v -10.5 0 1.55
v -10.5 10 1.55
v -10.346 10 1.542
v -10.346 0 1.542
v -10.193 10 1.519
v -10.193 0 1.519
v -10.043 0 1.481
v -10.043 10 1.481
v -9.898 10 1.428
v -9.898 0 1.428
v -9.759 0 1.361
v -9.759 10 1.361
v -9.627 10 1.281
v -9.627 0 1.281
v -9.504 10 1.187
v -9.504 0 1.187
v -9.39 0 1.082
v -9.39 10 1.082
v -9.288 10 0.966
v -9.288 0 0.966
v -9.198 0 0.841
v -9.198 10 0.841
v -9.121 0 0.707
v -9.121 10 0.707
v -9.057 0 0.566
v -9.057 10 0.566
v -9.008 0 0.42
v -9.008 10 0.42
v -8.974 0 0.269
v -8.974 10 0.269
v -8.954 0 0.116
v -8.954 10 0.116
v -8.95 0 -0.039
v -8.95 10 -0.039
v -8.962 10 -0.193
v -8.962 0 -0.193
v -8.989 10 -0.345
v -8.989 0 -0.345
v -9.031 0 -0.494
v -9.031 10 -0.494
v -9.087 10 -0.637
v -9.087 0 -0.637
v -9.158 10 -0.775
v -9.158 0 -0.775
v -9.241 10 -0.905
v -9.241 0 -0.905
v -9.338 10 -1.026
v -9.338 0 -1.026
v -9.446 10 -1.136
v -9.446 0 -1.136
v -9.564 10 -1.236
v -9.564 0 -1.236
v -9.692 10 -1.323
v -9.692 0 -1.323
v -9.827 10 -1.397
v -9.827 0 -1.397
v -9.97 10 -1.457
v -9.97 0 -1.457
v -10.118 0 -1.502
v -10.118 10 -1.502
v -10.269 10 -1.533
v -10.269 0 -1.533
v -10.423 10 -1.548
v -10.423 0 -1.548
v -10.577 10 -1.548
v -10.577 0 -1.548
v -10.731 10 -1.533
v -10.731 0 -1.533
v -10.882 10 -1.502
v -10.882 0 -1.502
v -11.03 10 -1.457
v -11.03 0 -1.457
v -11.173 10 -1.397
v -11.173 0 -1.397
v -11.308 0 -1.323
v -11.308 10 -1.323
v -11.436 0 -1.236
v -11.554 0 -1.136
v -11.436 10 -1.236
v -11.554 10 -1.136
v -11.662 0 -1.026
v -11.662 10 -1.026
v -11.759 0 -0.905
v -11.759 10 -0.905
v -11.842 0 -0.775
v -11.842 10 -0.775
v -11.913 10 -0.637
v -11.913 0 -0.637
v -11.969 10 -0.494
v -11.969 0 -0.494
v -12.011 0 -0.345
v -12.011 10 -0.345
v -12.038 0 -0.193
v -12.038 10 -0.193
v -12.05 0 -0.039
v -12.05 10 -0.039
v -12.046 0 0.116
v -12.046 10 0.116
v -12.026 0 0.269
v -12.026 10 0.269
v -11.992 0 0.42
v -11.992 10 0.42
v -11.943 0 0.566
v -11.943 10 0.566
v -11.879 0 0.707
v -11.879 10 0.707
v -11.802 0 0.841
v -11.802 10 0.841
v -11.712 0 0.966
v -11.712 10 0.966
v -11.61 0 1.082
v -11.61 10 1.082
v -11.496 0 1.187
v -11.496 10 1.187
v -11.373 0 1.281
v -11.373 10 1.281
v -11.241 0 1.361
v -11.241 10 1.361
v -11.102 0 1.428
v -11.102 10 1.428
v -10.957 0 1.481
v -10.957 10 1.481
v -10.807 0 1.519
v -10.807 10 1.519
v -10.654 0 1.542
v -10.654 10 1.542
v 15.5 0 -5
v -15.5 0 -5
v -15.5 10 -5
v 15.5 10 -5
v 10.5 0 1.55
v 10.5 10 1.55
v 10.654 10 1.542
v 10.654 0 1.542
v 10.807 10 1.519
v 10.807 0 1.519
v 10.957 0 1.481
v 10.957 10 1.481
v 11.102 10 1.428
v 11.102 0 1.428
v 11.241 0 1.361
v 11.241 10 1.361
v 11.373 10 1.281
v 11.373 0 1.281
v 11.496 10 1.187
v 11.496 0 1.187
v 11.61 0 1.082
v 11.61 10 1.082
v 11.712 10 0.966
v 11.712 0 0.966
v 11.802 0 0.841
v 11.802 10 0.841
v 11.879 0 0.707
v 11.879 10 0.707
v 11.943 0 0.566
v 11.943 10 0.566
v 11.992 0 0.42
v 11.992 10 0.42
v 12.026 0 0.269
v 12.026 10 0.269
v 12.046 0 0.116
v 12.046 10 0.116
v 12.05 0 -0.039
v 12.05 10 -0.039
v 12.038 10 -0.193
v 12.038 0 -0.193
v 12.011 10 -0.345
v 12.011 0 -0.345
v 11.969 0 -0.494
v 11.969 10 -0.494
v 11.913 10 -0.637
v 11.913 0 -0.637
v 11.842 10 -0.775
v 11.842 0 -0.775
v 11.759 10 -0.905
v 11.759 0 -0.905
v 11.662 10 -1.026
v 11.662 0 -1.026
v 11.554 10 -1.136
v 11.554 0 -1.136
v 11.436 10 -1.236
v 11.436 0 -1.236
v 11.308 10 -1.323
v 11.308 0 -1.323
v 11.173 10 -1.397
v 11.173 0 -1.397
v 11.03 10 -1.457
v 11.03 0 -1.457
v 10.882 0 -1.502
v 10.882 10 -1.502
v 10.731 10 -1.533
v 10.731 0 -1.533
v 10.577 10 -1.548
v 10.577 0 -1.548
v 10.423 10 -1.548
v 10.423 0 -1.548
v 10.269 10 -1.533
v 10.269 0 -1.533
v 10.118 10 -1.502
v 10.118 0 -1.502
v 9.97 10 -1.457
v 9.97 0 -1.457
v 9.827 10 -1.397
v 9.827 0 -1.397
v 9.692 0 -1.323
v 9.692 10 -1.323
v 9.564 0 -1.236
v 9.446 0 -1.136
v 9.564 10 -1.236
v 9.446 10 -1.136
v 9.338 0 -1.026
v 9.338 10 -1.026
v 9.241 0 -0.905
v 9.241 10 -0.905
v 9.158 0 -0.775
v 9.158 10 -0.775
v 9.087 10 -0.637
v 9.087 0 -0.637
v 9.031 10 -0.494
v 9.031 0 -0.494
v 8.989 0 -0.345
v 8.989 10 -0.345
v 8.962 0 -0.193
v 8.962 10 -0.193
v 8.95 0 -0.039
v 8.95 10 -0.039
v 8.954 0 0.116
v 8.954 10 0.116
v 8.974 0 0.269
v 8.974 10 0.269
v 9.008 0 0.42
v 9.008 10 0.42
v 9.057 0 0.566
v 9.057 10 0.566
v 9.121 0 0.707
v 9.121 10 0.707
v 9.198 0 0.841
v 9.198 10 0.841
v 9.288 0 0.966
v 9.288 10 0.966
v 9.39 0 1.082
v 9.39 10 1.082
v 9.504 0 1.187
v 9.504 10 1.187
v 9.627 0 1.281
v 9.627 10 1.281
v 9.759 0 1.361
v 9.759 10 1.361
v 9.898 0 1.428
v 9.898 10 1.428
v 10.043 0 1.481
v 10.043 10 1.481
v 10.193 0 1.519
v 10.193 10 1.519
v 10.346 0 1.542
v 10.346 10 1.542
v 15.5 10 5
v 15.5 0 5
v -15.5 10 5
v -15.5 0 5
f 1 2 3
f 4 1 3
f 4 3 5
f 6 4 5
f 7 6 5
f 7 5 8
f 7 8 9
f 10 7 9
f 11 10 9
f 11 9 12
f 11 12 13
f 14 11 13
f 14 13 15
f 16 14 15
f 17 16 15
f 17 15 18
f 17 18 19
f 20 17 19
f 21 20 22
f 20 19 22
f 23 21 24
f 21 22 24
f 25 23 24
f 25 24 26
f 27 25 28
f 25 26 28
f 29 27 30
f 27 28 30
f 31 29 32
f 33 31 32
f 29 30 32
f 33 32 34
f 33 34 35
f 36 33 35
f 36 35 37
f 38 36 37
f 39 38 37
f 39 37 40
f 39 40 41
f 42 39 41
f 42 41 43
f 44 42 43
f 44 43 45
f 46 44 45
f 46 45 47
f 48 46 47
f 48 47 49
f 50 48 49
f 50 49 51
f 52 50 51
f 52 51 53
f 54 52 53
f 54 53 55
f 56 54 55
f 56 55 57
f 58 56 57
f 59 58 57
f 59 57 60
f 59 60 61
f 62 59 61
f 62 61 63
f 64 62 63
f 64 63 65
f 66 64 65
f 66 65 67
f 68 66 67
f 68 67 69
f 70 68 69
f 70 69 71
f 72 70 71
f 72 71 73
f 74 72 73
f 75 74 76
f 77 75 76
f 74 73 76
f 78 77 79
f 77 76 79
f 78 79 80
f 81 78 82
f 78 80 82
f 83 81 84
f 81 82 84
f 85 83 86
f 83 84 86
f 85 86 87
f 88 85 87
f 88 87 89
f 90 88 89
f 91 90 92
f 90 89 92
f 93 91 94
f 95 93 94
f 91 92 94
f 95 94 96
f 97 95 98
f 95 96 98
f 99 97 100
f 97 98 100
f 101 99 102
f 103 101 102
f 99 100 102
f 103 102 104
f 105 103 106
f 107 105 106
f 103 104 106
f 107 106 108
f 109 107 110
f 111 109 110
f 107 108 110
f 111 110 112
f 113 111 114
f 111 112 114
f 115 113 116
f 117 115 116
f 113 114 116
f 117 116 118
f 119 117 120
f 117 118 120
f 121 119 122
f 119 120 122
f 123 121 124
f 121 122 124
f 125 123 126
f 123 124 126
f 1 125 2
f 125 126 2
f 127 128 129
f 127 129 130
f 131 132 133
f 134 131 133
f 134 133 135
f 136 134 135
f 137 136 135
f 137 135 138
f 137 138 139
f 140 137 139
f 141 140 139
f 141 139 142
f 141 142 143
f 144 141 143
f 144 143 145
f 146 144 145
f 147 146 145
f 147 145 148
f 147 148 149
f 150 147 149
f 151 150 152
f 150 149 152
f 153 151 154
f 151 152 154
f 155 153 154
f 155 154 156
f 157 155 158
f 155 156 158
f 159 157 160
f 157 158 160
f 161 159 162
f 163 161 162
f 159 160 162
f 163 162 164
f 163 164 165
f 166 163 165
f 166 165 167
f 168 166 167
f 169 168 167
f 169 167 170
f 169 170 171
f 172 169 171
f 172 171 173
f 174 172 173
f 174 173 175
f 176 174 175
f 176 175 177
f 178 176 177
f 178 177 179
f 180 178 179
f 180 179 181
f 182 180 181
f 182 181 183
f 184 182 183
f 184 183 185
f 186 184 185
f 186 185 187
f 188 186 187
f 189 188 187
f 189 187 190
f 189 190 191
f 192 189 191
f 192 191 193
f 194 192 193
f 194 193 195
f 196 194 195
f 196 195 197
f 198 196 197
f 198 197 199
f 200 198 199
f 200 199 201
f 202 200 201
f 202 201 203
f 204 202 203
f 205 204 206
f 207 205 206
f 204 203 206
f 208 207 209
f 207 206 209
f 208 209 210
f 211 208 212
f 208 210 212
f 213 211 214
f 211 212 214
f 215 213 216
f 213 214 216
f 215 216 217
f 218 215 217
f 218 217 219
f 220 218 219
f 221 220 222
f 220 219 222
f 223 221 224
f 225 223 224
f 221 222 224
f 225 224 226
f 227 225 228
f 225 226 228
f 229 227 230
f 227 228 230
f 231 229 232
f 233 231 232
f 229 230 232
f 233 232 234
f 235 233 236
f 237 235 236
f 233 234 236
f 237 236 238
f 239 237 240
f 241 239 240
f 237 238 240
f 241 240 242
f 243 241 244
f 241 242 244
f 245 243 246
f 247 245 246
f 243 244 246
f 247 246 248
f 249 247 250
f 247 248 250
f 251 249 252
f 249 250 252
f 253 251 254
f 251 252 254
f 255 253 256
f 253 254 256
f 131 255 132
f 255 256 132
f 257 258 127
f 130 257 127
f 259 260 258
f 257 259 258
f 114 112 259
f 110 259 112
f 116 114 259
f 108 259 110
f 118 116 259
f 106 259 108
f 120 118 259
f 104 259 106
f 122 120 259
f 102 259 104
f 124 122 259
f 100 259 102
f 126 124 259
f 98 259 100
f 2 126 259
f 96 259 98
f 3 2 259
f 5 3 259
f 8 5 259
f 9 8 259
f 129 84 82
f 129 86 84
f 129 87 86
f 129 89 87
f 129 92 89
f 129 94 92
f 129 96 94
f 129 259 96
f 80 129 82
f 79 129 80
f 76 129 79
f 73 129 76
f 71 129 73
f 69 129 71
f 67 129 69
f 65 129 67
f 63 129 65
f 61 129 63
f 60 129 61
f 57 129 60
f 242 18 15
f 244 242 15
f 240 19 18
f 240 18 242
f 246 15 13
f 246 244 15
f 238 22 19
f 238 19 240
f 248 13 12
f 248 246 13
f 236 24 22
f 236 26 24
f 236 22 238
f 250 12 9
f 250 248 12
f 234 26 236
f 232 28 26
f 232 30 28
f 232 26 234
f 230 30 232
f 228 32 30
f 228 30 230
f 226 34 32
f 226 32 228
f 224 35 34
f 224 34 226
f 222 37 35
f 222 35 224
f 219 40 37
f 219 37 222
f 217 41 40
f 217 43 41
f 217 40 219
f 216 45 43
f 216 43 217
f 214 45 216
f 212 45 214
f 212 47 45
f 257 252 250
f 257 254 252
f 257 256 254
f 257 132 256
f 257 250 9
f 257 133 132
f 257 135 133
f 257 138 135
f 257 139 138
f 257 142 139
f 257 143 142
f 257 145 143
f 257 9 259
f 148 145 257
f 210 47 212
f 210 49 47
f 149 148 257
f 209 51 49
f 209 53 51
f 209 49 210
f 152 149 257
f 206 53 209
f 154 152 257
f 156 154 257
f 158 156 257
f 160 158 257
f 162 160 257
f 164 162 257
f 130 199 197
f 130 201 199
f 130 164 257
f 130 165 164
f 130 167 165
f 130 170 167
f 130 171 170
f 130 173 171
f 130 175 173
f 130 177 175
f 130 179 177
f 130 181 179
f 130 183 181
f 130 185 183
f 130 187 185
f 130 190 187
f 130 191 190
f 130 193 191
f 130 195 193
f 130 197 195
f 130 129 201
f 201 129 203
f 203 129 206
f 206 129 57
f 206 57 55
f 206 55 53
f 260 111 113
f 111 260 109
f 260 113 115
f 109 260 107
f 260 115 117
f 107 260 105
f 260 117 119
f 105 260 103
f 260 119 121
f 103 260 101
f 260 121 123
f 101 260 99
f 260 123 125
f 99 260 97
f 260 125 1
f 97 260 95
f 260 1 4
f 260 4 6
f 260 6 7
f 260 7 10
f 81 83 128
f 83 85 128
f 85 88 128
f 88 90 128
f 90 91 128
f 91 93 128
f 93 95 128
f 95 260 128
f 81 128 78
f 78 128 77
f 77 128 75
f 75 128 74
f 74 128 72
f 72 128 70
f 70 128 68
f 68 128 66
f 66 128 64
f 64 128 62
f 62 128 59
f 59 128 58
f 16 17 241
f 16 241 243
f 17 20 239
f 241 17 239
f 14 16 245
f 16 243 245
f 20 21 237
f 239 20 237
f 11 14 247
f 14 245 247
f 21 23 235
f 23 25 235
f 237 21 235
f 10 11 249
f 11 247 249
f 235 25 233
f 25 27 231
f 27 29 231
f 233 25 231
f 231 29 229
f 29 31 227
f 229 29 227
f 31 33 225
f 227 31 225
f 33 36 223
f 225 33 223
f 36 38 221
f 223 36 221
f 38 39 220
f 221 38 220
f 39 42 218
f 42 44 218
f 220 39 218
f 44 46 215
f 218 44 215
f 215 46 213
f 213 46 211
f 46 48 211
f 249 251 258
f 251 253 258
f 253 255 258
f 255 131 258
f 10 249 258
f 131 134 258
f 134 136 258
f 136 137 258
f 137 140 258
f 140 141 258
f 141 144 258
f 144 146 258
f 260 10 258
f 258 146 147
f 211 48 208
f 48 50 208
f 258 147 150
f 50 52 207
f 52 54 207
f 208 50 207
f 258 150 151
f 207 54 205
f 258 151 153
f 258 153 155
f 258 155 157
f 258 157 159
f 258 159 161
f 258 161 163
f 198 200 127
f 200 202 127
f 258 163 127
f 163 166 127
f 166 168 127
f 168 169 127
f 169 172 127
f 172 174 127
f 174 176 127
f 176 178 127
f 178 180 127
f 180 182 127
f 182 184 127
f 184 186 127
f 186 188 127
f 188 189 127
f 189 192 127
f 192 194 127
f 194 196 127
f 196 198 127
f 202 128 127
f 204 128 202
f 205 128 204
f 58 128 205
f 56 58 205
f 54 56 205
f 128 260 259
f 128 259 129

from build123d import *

# Parameters (mm, degrees)
SKETCH_1_W          = 31
SKETCH_1_H          = 10
EXTRUDE_1_DEPTH     = 10
SKETCH_2_R          = 1.55
CUT_EXTRUDE_1_DEPTH = 20.111514854


with BuildPart() as part:
    # ｽｹｯﾁ1 → ﾎﾞｽ - 押し出し1 (new body)
    with BuildSketch(Plane(origin=(0, 0, 0), x_dir=(1, 0, 0), z_dir=(0, 1, 0))):
        Rectangle(SKETCH_1_W, SKETCH_1_H)
    extrude(amount=EXTRUDE_1_DEPTH)

    # ｽｹｯﾁ2 → ｶｯﾄ - 押し出し1 (cut, through all)
    with BuildSketch(Plane(origin=(0, 10, 0), x_dir=(1, 0, 0), z_dir=(0, 1, 0))):
        with Locations(Location((-10.5, 0, 0), (0, 0, 270))):
            Circle(SKETCH_2_R)
        with Locations(Location((10.5, 0, 0), (0, 0, 270))):
            Circle(SKETCH_2_R)
    extrude(amount=-CUT_EXTRUDE_1_DEPTH, mode=Mode.SUBTRACT)


solid = part.part
